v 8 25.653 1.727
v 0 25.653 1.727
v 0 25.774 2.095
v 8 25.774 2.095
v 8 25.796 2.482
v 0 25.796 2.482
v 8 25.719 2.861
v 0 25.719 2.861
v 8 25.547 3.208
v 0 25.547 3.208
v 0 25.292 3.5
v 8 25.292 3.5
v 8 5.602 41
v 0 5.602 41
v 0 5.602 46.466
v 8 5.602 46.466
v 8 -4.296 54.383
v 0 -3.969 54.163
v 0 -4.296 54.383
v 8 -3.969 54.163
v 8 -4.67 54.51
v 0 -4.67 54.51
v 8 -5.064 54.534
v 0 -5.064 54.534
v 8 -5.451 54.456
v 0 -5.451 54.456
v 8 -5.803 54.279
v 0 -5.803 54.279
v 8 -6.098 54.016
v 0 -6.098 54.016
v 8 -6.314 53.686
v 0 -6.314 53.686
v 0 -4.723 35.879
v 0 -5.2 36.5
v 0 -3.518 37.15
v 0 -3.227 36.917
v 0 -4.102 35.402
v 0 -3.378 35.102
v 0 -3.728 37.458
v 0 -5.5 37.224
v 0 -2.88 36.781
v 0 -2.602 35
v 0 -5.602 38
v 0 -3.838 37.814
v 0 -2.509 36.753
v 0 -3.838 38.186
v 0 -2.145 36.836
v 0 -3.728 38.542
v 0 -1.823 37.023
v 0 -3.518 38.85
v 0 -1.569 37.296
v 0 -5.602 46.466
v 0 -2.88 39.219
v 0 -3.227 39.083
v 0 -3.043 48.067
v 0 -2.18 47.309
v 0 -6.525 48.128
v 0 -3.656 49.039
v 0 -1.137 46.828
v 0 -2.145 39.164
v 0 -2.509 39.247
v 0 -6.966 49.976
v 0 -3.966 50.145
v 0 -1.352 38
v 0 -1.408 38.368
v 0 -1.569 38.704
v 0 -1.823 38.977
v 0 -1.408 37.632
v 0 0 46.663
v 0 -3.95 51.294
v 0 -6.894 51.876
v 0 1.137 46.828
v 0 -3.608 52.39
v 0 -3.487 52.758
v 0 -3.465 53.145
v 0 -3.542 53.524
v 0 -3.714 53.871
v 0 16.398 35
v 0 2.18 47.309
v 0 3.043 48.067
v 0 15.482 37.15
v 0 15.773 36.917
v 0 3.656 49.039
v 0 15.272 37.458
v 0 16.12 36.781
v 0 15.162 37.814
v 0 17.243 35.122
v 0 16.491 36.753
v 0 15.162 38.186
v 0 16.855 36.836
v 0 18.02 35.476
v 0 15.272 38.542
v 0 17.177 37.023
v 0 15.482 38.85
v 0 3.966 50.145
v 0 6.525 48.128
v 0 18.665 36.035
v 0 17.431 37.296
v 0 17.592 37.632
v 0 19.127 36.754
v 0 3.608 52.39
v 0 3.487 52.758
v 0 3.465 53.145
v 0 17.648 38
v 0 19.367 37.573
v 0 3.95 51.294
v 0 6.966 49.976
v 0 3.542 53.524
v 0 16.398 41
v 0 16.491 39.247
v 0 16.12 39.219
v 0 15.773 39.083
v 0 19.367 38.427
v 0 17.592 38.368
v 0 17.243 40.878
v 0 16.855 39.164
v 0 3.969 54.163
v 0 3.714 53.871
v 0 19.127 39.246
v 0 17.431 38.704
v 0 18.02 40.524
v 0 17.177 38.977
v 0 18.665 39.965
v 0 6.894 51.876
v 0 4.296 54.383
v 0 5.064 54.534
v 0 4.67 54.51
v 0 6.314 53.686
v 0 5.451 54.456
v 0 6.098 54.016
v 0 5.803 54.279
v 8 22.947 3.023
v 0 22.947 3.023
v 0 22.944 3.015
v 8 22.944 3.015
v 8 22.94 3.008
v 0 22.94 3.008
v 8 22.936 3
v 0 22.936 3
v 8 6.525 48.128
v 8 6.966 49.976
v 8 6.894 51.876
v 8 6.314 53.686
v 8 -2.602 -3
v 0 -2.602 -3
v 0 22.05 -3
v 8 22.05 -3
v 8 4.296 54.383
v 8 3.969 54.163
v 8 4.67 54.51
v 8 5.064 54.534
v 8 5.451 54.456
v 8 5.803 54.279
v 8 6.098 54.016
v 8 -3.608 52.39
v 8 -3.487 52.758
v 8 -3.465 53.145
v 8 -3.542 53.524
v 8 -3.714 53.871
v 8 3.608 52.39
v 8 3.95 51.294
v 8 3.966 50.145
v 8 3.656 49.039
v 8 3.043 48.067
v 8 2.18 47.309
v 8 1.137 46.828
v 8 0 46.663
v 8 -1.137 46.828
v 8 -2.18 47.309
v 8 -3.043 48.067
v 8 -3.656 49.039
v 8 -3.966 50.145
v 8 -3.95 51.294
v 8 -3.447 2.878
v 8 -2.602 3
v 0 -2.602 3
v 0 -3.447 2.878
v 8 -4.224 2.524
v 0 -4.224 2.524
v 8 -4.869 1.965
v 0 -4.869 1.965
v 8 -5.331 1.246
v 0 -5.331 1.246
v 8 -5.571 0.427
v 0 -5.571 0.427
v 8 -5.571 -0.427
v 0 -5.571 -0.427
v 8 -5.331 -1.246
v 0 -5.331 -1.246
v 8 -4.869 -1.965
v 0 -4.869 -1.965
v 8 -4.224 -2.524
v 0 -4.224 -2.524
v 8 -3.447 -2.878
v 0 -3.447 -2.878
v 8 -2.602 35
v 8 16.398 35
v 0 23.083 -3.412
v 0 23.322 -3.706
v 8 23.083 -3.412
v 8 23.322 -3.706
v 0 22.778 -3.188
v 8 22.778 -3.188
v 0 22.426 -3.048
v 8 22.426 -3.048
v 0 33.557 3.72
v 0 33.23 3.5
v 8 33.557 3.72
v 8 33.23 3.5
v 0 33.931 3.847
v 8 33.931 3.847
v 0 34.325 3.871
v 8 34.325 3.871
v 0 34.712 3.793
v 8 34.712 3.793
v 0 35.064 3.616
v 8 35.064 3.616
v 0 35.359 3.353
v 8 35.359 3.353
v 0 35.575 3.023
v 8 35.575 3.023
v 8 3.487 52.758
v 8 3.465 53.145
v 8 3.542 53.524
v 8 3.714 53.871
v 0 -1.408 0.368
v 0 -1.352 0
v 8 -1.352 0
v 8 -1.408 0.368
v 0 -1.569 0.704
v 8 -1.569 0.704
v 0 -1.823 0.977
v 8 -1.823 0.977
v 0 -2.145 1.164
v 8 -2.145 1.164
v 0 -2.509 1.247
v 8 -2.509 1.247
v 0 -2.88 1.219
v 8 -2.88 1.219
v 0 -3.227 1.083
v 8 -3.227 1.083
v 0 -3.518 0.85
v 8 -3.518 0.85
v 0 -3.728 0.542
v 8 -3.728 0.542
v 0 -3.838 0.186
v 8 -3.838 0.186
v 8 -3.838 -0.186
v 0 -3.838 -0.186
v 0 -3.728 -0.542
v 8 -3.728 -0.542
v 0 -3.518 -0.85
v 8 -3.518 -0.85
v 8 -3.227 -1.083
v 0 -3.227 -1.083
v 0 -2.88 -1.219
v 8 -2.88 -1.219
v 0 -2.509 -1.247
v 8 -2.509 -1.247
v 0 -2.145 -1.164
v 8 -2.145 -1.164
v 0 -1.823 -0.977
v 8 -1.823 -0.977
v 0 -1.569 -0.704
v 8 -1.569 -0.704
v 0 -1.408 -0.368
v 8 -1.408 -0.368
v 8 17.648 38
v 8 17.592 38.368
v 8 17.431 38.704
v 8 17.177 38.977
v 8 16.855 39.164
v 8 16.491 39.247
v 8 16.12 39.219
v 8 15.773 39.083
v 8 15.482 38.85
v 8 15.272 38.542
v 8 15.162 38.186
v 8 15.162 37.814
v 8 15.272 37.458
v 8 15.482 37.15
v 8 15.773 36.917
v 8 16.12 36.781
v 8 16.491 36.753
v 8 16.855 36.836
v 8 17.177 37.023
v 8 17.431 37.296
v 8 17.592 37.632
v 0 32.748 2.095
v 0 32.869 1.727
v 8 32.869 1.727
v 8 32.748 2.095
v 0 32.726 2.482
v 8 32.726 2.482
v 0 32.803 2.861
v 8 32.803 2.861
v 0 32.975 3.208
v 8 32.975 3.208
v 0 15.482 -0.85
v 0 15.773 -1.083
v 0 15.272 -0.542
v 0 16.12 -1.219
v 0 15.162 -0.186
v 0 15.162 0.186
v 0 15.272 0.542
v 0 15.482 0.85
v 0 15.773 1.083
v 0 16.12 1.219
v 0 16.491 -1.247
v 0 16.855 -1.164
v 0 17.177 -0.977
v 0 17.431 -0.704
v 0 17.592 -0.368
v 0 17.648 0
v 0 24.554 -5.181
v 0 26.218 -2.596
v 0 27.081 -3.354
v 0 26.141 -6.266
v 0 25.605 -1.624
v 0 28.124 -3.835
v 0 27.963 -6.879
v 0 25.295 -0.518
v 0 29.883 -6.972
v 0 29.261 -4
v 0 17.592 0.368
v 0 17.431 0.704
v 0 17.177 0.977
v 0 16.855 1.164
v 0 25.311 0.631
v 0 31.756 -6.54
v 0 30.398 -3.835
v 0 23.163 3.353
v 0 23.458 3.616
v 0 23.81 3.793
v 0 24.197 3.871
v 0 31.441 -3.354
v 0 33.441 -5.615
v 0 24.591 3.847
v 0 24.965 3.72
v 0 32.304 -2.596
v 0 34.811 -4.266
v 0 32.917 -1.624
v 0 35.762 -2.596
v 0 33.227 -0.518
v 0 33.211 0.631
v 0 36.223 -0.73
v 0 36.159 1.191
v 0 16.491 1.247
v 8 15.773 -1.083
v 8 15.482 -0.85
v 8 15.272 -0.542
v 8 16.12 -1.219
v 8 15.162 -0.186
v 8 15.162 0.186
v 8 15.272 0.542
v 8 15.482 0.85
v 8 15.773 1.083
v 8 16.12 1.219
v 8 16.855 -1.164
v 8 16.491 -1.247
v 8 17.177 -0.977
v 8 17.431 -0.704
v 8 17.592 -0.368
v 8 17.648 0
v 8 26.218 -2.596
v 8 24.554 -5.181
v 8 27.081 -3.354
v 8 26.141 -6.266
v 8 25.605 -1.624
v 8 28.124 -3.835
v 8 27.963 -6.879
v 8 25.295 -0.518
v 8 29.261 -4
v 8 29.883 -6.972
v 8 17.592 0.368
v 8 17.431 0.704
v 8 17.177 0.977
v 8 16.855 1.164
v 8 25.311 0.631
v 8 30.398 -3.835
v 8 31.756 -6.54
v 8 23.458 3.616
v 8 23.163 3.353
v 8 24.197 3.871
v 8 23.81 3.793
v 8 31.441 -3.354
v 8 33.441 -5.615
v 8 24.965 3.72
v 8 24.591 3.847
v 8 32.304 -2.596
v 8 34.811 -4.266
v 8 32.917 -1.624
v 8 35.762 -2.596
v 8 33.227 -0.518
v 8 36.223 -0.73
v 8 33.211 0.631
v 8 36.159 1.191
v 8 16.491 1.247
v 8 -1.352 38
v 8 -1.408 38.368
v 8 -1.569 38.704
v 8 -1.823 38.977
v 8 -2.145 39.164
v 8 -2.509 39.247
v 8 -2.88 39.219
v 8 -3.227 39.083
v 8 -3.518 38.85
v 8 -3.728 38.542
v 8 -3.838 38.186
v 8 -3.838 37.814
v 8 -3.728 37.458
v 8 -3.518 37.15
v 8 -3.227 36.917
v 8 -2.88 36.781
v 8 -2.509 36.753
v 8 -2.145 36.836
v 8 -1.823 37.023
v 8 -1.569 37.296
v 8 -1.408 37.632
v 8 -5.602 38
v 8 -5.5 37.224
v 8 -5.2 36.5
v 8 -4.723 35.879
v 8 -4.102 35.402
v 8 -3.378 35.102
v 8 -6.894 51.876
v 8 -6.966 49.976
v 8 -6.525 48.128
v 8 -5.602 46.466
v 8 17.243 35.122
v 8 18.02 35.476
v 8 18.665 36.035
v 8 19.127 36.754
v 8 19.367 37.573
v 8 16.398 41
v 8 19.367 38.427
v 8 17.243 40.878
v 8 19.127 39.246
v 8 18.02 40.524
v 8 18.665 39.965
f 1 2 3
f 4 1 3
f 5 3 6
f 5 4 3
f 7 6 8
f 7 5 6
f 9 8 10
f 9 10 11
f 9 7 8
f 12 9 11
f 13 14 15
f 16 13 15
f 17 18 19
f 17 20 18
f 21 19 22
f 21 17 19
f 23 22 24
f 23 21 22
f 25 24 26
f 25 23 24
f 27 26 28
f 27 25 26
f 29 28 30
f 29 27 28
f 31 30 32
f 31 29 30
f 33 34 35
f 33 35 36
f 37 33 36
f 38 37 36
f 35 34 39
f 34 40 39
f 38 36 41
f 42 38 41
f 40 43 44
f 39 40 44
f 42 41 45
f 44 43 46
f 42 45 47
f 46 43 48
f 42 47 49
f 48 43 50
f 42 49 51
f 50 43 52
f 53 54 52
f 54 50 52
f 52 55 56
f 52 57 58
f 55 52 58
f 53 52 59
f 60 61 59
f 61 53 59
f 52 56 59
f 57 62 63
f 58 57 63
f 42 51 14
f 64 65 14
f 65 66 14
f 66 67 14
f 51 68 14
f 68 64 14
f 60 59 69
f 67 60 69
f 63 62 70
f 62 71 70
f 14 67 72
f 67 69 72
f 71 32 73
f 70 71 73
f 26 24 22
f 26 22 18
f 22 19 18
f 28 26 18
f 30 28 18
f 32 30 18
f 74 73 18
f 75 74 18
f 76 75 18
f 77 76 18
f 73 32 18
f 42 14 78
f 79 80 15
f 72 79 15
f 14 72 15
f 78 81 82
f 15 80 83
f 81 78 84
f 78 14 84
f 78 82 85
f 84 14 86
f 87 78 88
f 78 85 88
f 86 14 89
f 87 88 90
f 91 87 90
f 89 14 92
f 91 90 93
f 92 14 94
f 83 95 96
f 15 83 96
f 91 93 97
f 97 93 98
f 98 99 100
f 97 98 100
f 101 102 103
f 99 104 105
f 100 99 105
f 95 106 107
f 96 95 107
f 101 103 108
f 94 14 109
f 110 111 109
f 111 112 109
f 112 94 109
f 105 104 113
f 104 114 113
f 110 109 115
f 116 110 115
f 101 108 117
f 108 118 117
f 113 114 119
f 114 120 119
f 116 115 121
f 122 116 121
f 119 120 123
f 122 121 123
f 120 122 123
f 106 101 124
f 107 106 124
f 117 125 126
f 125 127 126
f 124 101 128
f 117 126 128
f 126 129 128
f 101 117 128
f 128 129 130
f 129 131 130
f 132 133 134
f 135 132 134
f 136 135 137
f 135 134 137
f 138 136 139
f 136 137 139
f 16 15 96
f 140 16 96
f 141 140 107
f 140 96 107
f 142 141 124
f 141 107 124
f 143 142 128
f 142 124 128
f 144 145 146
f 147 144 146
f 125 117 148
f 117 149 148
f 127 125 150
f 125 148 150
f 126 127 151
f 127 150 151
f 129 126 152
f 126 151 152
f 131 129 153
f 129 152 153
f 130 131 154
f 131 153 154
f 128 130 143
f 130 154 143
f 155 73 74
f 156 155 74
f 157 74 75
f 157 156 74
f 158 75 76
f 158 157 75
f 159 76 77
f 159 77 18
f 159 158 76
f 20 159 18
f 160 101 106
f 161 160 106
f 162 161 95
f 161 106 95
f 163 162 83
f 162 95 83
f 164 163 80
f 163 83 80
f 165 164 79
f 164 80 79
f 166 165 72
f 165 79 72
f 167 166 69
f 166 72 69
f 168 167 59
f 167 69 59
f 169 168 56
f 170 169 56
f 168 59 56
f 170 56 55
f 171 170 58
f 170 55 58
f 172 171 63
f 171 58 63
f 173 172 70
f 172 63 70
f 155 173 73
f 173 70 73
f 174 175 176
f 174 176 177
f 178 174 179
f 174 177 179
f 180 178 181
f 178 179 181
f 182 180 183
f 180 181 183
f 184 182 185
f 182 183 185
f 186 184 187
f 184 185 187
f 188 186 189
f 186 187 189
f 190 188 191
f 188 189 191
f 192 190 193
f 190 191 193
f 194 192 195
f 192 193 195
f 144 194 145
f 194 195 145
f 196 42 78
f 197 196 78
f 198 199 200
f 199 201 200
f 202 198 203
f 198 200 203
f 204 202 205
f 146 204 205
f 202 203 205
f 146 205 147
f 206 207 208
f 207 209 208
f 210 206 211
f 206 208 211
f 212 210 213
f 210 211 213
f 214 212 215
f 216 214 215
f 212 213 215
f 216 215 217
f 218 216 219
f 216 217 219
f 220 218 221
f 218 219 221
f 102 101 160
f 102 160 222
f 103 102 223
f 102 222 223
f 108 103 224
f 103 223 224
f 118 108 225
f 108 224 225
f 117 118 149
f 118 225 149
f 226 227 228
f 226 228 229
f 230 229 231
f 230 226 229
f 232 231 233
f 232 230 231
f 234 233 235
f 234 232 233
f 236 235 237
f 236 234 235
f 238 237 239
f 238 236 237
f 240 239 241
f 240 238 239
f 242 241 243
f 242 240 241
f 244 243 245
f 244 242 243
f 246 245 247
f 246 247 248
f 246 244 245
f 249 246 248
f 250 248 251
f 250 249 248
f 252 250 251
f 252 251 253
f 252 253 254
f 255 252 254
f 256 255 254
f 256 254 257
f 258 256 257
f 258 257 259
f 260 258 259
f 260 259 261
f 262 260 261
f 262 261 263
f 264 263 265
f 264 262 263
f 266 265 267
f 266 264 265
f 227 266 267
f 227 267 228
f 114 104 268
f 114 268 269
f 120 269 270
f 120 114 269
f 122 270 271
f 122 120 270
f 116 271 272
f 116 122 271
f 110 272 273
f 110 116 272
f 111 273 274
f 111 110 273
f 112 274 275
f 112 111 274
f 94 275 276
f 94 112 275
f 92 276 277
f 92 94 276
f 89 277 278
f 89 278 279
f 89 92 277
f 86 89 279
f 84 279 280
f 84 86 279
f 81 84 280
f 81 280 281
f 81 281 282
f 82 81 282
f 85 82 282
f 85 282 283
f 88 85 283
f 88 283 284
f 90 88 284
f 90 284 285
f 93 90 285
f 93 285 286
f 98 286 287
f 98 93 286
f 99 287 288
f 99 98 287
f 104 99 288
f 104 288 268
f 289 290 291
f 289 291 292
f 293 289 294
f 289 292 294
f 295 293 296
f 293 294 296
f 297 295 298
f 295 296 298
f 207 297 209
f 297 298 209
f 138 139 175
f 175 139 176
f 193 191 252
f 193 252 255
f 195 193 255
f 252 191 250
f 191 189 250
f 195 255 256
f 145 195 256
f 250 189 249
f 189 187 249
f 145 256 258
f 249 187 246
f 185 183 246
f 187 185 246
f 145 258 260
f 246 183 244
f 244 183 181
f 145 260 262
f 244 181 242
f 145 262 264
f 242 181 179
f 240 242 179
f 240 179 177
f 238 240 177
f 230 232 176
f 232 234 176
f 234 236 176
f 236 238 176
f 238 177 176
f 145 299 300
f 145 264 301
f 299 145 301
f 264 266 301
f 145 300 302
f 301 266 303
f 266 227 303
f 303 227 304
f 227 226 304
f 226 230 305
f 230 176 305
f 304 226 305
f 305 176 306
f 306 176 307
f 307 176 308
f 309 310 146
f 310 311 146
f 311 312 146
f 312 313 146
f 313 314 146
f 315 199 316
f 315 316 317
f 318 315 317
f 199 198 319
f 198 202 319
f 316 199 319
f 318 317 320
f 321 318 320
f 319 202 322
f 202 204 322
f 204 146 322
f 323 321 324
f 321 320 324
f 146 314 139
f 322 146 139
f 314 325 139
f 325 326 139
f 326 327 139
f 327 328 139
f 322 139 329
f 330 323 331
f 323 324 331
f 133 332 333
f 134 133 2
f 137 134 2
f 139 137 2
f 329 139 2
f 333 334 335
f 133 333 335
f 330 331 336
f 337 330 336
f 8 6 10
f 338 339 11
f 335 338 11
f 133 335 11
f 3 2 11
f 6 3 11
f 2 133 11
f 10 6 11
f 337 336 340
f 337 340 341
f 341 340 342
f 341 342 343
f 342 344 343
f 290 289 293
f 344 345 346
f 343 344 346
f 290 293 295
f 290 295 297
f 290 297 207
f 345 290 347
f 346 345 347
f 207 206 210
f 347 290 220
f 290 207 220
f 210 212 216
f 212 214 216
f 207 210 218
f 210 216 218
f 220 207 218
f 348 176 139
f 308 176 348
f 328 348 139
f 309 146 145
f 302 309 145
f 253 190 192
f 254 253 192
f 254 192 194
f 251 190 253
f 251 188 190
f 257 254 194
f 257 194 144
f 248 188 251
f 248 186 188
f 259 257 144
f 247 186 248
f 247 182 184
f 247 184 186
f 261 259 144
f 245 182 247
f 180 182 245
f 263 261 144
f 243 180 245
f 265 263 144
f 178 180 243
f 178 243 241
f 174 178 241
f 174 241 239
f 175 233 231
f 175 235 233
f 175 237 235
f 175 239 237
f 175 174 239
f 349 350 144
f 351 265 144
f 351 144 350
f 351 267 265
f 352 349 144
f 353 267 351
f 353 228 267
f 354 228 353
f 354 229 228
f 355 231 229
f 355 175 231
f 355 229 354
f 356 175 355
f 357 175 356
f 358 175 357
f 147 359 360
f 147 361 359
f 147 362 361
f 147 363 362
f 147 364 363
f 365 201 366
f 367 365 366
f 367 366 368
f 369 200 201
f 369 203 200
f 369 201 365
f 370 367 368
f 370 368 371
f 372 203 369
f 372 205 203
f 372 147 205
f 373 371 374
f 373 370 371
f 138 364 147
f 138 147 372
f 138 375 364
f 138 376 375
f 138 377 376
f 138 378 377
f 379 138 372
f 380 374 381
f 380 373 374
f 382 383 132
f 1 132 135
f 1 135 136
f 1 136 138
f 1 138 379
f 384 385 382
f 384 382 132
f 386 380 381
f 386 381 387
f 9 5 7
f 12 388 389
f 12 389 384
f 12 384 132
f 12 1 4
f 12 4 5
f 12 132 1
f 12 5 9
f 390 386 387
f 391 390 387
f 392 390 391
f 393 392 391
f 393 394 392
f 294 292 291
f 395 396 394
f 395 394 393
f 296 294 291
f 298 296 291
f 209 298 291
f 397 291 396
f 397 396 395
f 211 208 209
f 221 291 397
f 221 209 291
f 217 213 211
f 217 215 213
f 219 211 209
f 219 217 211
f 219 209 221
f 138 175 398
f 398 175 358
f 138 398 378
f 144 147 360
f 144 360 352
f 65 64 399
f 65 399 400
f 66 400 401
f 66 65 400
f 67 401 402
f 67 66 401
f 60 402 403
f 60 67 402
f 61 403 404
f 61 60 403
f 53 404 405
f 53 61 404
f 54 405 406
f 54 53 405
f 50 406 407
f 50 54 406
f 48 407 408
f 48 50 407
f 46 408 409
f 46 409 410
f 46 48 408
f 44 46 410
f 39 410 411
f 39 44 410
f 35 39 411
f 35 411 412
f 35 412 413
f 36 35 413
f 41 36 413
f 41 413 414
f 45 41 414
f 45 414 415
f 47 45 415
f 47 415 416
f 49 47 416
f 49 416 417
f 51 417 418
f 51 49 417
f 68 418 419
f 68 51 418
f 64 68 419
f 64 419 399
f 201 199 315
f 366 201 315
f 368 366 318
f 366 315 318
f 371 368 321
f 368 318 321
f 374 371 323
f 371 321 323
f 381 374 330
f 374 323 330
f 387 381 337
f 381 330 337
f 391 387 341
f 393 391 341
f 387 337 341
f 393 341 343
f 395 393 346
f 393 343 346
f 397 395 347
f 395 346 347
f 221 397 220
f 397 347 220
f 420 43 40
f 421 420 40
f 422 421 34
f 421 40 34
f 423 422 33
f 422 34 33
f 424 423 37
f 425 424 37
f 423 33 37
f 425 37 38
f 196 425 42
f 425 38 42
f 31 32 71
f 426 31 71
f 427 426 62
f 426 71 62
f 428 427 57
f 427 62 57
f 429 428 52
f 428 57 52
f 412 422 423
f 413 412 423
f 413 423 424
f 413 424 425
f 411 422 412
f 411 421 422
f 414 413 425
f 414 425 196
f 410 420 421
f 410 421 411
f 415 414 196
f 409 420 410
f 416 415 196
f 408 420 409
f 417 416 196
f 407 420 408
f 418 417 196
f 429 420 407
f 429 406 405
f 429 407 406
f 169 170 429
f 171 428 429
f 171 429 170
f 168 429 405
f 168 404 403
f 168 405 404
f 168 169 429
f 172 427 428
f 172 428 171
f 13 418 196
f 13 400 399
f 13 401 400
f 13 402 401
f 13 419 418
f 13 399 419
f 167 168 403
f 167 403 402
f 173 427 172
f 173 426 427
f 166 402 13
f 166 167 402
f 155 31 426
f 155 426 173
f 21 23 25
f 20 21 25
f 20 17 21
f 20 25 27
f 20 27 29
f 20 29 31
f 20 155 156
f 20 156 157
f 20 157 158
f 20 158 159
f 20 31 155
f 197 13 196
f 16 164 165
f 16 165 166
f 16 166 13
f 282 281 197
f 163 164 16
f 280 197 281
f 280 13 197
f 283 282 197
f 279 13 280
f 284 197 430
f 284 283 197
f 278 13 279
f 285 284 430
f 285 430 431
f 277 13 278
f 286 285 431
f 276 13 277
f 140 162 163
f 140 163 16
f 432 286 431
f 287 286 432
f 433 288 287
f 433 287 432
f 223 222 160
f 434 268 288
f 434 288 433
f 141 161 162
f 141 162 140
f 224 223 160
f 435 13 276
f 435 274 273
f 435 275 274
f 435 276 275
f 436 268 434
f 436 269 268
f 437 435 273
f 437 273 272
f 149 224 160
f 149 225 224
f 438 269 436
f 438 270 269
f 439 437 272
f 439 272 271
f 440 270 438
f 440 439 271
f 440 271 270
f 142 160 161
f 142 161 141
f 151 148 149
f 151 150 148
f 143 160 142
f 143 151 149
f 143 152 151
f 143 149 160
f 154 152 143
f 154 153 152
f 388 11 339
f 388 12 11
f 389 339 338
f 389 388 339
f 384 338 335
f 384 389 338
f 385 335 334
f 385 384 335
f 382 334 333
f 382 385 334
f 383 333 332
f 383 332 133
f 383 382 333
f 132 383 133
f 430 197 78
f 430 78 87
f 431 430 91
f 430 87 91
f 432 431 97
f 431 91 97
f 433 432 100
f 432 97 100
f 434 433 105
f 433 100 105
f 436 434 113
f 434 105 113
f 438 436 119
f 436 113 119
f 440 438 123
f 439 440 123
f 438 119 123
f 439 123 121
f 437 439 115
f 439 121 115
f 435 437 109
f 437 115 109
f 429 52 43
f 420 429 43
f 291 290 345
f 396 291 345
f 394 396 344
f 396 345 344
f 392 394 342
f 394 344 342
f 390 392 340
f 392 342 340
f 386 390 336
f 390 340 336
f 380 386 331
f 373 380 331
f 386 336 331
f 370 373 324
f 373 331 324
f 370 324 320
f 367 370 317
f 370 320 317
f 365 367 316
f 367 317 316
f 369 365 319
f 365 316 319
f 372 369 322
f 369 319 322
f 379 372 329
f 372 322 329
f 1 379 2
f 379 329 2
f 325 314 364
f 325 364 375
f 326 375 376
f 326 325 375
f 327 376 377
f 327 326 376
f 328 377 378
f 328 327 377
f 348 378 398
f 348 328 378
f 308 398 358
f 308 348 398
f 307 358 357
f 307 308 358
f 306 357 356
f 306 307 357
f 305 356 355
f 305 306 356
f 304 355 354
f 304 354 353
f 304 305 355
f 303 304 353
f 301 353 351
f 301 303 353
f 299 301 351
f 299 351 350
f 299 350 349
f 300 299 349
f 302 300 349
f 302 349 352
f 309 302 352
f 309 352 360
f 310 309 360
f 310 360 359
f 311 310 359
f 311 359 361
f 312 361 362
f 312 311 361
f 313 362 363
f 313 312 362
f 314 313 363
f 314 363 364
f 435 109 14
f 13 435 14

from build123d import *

# Parameters (mm, degrees)
F0_R     = 1.25
F1_DEPTH = 8
F2_R     = 1.49999
F3_R     = 1.49999


# Not quite as in the source:
# - a fillet or chamfer is up to 0.001 mm smaller than in the source, because OpenCascade refuses the exact size


with BuildPart() as f1:
    # F0 (on Right) → F1 (new body)
    with BuildSketch(Plane.YZ):
        with BuildLine():
            ThreePointArc((3, 53.3087513111), (0, 46.663), (-3, 53.3087513111))
            Line((-3, 53.3087513111), (-5.25, 55.2930647944))
            ThreePointArc((-5.25, 55.2930647944), (-6.9944413347, 50.9419093324), (-5.602, 46.4656679903))
            Line((-5.602, 46.4656679903), (-5.602, 38))
            ThreePointArc((-5.602, 38), (-4.7233203436, 35.8786796564), (-2.602, 35))
            Line((-2.602, 35), (16.398, 35))
            ThreePointArc((16.398, 35), (19.398, 38), (16.398, 41))
            Line((16.398, 41), (5.602, 41))
            Line((5.602, 41), (5.602, 46.4656679903))
            ThreePointArc((5.602, 46.4656679903), (6.9944413347, 50.9419093324), (5.25, 55.2930647944))
            Line((5.25, 55.2930647944), (3, 53.3087513111))
        make_face()
        with Locations((-2.602, 38)):
            Circle(F0_R, mode=Mode.SUBTRACT)
        with Locations((16.398, 38)):
            Circle(F0_R, mode=Mode.SUBTRACT)
    extrude(amount=F1_DEPTH)

    # F2 (radius 1.5 in the source; OpenCascade refuses exactly that, so slightly less here)
    f2_edges = [f1.edges().sort_by_distance(p)[0] for p in [
        (4, -5.25, 55.293065),
        (4, 5.25, 55.293065),
        (4, -3, 53.308751),
        (4, 3, 53.308751),
    ]]
    fillet(f2_edges, radius=F2_R)


with BuildPart() as f1b:
    # F0 (on Right) → F1, piece 2 (new body)
    with BuildSketch(Plane.YZ):
        with BuildLine():
            ThreePointArc((32.261, 2.6457513111), (29.261, -4), (26.261, 2.6457513111))
            Line((26.261, 2.6457513111), (24.011, 4.6300647944))
            ThreePointArc((24.011, 4.6300647944), (23.4166129043, 3.8526795189), (22.9364446797, 3))
            Line((22.9364446797, 3), (-2.602, 3))
            ThreePointArc((-2.602, 3), (-5.602, 0), (-2.602, -3))
            Line((-2.602, -3), (22.9364446797, -3))
            ThreePointArc((22.9364446797, -3), (33.1136795189, -5.8443870957), (34.511, 4.6300647944))
            Line((34.511, 4.6300647944), (32.261, 2.6457513111))
        make_face()
        with Locations((-2.602, 0)):
            Circle(F0_R, mode=Mode.SUBTRACT)
        with Locations((16.398, 0)):
            Circle(F0_R, mode=Mode.SUBTRACT)
    extrude(amount=F1_DEPTH)

    # F3 (radius 1.5 in the source; OpenCascade refuses exactly that, so slightly less here)
    f3_edges = [f1b.edges().sort_by_distance(p)[0] for p in [
        (4, 32.261, 2.645751),
        (4, 26.261, 2.645751),
        (4, 24.011, 4.630065),
        (4, 34.511, 4.630065),
        (4, 22.936445, -3),
    ]]
    fillet(f3_edges, radius=F3_R)


solid = Compound([f1.part, f1b.part])
